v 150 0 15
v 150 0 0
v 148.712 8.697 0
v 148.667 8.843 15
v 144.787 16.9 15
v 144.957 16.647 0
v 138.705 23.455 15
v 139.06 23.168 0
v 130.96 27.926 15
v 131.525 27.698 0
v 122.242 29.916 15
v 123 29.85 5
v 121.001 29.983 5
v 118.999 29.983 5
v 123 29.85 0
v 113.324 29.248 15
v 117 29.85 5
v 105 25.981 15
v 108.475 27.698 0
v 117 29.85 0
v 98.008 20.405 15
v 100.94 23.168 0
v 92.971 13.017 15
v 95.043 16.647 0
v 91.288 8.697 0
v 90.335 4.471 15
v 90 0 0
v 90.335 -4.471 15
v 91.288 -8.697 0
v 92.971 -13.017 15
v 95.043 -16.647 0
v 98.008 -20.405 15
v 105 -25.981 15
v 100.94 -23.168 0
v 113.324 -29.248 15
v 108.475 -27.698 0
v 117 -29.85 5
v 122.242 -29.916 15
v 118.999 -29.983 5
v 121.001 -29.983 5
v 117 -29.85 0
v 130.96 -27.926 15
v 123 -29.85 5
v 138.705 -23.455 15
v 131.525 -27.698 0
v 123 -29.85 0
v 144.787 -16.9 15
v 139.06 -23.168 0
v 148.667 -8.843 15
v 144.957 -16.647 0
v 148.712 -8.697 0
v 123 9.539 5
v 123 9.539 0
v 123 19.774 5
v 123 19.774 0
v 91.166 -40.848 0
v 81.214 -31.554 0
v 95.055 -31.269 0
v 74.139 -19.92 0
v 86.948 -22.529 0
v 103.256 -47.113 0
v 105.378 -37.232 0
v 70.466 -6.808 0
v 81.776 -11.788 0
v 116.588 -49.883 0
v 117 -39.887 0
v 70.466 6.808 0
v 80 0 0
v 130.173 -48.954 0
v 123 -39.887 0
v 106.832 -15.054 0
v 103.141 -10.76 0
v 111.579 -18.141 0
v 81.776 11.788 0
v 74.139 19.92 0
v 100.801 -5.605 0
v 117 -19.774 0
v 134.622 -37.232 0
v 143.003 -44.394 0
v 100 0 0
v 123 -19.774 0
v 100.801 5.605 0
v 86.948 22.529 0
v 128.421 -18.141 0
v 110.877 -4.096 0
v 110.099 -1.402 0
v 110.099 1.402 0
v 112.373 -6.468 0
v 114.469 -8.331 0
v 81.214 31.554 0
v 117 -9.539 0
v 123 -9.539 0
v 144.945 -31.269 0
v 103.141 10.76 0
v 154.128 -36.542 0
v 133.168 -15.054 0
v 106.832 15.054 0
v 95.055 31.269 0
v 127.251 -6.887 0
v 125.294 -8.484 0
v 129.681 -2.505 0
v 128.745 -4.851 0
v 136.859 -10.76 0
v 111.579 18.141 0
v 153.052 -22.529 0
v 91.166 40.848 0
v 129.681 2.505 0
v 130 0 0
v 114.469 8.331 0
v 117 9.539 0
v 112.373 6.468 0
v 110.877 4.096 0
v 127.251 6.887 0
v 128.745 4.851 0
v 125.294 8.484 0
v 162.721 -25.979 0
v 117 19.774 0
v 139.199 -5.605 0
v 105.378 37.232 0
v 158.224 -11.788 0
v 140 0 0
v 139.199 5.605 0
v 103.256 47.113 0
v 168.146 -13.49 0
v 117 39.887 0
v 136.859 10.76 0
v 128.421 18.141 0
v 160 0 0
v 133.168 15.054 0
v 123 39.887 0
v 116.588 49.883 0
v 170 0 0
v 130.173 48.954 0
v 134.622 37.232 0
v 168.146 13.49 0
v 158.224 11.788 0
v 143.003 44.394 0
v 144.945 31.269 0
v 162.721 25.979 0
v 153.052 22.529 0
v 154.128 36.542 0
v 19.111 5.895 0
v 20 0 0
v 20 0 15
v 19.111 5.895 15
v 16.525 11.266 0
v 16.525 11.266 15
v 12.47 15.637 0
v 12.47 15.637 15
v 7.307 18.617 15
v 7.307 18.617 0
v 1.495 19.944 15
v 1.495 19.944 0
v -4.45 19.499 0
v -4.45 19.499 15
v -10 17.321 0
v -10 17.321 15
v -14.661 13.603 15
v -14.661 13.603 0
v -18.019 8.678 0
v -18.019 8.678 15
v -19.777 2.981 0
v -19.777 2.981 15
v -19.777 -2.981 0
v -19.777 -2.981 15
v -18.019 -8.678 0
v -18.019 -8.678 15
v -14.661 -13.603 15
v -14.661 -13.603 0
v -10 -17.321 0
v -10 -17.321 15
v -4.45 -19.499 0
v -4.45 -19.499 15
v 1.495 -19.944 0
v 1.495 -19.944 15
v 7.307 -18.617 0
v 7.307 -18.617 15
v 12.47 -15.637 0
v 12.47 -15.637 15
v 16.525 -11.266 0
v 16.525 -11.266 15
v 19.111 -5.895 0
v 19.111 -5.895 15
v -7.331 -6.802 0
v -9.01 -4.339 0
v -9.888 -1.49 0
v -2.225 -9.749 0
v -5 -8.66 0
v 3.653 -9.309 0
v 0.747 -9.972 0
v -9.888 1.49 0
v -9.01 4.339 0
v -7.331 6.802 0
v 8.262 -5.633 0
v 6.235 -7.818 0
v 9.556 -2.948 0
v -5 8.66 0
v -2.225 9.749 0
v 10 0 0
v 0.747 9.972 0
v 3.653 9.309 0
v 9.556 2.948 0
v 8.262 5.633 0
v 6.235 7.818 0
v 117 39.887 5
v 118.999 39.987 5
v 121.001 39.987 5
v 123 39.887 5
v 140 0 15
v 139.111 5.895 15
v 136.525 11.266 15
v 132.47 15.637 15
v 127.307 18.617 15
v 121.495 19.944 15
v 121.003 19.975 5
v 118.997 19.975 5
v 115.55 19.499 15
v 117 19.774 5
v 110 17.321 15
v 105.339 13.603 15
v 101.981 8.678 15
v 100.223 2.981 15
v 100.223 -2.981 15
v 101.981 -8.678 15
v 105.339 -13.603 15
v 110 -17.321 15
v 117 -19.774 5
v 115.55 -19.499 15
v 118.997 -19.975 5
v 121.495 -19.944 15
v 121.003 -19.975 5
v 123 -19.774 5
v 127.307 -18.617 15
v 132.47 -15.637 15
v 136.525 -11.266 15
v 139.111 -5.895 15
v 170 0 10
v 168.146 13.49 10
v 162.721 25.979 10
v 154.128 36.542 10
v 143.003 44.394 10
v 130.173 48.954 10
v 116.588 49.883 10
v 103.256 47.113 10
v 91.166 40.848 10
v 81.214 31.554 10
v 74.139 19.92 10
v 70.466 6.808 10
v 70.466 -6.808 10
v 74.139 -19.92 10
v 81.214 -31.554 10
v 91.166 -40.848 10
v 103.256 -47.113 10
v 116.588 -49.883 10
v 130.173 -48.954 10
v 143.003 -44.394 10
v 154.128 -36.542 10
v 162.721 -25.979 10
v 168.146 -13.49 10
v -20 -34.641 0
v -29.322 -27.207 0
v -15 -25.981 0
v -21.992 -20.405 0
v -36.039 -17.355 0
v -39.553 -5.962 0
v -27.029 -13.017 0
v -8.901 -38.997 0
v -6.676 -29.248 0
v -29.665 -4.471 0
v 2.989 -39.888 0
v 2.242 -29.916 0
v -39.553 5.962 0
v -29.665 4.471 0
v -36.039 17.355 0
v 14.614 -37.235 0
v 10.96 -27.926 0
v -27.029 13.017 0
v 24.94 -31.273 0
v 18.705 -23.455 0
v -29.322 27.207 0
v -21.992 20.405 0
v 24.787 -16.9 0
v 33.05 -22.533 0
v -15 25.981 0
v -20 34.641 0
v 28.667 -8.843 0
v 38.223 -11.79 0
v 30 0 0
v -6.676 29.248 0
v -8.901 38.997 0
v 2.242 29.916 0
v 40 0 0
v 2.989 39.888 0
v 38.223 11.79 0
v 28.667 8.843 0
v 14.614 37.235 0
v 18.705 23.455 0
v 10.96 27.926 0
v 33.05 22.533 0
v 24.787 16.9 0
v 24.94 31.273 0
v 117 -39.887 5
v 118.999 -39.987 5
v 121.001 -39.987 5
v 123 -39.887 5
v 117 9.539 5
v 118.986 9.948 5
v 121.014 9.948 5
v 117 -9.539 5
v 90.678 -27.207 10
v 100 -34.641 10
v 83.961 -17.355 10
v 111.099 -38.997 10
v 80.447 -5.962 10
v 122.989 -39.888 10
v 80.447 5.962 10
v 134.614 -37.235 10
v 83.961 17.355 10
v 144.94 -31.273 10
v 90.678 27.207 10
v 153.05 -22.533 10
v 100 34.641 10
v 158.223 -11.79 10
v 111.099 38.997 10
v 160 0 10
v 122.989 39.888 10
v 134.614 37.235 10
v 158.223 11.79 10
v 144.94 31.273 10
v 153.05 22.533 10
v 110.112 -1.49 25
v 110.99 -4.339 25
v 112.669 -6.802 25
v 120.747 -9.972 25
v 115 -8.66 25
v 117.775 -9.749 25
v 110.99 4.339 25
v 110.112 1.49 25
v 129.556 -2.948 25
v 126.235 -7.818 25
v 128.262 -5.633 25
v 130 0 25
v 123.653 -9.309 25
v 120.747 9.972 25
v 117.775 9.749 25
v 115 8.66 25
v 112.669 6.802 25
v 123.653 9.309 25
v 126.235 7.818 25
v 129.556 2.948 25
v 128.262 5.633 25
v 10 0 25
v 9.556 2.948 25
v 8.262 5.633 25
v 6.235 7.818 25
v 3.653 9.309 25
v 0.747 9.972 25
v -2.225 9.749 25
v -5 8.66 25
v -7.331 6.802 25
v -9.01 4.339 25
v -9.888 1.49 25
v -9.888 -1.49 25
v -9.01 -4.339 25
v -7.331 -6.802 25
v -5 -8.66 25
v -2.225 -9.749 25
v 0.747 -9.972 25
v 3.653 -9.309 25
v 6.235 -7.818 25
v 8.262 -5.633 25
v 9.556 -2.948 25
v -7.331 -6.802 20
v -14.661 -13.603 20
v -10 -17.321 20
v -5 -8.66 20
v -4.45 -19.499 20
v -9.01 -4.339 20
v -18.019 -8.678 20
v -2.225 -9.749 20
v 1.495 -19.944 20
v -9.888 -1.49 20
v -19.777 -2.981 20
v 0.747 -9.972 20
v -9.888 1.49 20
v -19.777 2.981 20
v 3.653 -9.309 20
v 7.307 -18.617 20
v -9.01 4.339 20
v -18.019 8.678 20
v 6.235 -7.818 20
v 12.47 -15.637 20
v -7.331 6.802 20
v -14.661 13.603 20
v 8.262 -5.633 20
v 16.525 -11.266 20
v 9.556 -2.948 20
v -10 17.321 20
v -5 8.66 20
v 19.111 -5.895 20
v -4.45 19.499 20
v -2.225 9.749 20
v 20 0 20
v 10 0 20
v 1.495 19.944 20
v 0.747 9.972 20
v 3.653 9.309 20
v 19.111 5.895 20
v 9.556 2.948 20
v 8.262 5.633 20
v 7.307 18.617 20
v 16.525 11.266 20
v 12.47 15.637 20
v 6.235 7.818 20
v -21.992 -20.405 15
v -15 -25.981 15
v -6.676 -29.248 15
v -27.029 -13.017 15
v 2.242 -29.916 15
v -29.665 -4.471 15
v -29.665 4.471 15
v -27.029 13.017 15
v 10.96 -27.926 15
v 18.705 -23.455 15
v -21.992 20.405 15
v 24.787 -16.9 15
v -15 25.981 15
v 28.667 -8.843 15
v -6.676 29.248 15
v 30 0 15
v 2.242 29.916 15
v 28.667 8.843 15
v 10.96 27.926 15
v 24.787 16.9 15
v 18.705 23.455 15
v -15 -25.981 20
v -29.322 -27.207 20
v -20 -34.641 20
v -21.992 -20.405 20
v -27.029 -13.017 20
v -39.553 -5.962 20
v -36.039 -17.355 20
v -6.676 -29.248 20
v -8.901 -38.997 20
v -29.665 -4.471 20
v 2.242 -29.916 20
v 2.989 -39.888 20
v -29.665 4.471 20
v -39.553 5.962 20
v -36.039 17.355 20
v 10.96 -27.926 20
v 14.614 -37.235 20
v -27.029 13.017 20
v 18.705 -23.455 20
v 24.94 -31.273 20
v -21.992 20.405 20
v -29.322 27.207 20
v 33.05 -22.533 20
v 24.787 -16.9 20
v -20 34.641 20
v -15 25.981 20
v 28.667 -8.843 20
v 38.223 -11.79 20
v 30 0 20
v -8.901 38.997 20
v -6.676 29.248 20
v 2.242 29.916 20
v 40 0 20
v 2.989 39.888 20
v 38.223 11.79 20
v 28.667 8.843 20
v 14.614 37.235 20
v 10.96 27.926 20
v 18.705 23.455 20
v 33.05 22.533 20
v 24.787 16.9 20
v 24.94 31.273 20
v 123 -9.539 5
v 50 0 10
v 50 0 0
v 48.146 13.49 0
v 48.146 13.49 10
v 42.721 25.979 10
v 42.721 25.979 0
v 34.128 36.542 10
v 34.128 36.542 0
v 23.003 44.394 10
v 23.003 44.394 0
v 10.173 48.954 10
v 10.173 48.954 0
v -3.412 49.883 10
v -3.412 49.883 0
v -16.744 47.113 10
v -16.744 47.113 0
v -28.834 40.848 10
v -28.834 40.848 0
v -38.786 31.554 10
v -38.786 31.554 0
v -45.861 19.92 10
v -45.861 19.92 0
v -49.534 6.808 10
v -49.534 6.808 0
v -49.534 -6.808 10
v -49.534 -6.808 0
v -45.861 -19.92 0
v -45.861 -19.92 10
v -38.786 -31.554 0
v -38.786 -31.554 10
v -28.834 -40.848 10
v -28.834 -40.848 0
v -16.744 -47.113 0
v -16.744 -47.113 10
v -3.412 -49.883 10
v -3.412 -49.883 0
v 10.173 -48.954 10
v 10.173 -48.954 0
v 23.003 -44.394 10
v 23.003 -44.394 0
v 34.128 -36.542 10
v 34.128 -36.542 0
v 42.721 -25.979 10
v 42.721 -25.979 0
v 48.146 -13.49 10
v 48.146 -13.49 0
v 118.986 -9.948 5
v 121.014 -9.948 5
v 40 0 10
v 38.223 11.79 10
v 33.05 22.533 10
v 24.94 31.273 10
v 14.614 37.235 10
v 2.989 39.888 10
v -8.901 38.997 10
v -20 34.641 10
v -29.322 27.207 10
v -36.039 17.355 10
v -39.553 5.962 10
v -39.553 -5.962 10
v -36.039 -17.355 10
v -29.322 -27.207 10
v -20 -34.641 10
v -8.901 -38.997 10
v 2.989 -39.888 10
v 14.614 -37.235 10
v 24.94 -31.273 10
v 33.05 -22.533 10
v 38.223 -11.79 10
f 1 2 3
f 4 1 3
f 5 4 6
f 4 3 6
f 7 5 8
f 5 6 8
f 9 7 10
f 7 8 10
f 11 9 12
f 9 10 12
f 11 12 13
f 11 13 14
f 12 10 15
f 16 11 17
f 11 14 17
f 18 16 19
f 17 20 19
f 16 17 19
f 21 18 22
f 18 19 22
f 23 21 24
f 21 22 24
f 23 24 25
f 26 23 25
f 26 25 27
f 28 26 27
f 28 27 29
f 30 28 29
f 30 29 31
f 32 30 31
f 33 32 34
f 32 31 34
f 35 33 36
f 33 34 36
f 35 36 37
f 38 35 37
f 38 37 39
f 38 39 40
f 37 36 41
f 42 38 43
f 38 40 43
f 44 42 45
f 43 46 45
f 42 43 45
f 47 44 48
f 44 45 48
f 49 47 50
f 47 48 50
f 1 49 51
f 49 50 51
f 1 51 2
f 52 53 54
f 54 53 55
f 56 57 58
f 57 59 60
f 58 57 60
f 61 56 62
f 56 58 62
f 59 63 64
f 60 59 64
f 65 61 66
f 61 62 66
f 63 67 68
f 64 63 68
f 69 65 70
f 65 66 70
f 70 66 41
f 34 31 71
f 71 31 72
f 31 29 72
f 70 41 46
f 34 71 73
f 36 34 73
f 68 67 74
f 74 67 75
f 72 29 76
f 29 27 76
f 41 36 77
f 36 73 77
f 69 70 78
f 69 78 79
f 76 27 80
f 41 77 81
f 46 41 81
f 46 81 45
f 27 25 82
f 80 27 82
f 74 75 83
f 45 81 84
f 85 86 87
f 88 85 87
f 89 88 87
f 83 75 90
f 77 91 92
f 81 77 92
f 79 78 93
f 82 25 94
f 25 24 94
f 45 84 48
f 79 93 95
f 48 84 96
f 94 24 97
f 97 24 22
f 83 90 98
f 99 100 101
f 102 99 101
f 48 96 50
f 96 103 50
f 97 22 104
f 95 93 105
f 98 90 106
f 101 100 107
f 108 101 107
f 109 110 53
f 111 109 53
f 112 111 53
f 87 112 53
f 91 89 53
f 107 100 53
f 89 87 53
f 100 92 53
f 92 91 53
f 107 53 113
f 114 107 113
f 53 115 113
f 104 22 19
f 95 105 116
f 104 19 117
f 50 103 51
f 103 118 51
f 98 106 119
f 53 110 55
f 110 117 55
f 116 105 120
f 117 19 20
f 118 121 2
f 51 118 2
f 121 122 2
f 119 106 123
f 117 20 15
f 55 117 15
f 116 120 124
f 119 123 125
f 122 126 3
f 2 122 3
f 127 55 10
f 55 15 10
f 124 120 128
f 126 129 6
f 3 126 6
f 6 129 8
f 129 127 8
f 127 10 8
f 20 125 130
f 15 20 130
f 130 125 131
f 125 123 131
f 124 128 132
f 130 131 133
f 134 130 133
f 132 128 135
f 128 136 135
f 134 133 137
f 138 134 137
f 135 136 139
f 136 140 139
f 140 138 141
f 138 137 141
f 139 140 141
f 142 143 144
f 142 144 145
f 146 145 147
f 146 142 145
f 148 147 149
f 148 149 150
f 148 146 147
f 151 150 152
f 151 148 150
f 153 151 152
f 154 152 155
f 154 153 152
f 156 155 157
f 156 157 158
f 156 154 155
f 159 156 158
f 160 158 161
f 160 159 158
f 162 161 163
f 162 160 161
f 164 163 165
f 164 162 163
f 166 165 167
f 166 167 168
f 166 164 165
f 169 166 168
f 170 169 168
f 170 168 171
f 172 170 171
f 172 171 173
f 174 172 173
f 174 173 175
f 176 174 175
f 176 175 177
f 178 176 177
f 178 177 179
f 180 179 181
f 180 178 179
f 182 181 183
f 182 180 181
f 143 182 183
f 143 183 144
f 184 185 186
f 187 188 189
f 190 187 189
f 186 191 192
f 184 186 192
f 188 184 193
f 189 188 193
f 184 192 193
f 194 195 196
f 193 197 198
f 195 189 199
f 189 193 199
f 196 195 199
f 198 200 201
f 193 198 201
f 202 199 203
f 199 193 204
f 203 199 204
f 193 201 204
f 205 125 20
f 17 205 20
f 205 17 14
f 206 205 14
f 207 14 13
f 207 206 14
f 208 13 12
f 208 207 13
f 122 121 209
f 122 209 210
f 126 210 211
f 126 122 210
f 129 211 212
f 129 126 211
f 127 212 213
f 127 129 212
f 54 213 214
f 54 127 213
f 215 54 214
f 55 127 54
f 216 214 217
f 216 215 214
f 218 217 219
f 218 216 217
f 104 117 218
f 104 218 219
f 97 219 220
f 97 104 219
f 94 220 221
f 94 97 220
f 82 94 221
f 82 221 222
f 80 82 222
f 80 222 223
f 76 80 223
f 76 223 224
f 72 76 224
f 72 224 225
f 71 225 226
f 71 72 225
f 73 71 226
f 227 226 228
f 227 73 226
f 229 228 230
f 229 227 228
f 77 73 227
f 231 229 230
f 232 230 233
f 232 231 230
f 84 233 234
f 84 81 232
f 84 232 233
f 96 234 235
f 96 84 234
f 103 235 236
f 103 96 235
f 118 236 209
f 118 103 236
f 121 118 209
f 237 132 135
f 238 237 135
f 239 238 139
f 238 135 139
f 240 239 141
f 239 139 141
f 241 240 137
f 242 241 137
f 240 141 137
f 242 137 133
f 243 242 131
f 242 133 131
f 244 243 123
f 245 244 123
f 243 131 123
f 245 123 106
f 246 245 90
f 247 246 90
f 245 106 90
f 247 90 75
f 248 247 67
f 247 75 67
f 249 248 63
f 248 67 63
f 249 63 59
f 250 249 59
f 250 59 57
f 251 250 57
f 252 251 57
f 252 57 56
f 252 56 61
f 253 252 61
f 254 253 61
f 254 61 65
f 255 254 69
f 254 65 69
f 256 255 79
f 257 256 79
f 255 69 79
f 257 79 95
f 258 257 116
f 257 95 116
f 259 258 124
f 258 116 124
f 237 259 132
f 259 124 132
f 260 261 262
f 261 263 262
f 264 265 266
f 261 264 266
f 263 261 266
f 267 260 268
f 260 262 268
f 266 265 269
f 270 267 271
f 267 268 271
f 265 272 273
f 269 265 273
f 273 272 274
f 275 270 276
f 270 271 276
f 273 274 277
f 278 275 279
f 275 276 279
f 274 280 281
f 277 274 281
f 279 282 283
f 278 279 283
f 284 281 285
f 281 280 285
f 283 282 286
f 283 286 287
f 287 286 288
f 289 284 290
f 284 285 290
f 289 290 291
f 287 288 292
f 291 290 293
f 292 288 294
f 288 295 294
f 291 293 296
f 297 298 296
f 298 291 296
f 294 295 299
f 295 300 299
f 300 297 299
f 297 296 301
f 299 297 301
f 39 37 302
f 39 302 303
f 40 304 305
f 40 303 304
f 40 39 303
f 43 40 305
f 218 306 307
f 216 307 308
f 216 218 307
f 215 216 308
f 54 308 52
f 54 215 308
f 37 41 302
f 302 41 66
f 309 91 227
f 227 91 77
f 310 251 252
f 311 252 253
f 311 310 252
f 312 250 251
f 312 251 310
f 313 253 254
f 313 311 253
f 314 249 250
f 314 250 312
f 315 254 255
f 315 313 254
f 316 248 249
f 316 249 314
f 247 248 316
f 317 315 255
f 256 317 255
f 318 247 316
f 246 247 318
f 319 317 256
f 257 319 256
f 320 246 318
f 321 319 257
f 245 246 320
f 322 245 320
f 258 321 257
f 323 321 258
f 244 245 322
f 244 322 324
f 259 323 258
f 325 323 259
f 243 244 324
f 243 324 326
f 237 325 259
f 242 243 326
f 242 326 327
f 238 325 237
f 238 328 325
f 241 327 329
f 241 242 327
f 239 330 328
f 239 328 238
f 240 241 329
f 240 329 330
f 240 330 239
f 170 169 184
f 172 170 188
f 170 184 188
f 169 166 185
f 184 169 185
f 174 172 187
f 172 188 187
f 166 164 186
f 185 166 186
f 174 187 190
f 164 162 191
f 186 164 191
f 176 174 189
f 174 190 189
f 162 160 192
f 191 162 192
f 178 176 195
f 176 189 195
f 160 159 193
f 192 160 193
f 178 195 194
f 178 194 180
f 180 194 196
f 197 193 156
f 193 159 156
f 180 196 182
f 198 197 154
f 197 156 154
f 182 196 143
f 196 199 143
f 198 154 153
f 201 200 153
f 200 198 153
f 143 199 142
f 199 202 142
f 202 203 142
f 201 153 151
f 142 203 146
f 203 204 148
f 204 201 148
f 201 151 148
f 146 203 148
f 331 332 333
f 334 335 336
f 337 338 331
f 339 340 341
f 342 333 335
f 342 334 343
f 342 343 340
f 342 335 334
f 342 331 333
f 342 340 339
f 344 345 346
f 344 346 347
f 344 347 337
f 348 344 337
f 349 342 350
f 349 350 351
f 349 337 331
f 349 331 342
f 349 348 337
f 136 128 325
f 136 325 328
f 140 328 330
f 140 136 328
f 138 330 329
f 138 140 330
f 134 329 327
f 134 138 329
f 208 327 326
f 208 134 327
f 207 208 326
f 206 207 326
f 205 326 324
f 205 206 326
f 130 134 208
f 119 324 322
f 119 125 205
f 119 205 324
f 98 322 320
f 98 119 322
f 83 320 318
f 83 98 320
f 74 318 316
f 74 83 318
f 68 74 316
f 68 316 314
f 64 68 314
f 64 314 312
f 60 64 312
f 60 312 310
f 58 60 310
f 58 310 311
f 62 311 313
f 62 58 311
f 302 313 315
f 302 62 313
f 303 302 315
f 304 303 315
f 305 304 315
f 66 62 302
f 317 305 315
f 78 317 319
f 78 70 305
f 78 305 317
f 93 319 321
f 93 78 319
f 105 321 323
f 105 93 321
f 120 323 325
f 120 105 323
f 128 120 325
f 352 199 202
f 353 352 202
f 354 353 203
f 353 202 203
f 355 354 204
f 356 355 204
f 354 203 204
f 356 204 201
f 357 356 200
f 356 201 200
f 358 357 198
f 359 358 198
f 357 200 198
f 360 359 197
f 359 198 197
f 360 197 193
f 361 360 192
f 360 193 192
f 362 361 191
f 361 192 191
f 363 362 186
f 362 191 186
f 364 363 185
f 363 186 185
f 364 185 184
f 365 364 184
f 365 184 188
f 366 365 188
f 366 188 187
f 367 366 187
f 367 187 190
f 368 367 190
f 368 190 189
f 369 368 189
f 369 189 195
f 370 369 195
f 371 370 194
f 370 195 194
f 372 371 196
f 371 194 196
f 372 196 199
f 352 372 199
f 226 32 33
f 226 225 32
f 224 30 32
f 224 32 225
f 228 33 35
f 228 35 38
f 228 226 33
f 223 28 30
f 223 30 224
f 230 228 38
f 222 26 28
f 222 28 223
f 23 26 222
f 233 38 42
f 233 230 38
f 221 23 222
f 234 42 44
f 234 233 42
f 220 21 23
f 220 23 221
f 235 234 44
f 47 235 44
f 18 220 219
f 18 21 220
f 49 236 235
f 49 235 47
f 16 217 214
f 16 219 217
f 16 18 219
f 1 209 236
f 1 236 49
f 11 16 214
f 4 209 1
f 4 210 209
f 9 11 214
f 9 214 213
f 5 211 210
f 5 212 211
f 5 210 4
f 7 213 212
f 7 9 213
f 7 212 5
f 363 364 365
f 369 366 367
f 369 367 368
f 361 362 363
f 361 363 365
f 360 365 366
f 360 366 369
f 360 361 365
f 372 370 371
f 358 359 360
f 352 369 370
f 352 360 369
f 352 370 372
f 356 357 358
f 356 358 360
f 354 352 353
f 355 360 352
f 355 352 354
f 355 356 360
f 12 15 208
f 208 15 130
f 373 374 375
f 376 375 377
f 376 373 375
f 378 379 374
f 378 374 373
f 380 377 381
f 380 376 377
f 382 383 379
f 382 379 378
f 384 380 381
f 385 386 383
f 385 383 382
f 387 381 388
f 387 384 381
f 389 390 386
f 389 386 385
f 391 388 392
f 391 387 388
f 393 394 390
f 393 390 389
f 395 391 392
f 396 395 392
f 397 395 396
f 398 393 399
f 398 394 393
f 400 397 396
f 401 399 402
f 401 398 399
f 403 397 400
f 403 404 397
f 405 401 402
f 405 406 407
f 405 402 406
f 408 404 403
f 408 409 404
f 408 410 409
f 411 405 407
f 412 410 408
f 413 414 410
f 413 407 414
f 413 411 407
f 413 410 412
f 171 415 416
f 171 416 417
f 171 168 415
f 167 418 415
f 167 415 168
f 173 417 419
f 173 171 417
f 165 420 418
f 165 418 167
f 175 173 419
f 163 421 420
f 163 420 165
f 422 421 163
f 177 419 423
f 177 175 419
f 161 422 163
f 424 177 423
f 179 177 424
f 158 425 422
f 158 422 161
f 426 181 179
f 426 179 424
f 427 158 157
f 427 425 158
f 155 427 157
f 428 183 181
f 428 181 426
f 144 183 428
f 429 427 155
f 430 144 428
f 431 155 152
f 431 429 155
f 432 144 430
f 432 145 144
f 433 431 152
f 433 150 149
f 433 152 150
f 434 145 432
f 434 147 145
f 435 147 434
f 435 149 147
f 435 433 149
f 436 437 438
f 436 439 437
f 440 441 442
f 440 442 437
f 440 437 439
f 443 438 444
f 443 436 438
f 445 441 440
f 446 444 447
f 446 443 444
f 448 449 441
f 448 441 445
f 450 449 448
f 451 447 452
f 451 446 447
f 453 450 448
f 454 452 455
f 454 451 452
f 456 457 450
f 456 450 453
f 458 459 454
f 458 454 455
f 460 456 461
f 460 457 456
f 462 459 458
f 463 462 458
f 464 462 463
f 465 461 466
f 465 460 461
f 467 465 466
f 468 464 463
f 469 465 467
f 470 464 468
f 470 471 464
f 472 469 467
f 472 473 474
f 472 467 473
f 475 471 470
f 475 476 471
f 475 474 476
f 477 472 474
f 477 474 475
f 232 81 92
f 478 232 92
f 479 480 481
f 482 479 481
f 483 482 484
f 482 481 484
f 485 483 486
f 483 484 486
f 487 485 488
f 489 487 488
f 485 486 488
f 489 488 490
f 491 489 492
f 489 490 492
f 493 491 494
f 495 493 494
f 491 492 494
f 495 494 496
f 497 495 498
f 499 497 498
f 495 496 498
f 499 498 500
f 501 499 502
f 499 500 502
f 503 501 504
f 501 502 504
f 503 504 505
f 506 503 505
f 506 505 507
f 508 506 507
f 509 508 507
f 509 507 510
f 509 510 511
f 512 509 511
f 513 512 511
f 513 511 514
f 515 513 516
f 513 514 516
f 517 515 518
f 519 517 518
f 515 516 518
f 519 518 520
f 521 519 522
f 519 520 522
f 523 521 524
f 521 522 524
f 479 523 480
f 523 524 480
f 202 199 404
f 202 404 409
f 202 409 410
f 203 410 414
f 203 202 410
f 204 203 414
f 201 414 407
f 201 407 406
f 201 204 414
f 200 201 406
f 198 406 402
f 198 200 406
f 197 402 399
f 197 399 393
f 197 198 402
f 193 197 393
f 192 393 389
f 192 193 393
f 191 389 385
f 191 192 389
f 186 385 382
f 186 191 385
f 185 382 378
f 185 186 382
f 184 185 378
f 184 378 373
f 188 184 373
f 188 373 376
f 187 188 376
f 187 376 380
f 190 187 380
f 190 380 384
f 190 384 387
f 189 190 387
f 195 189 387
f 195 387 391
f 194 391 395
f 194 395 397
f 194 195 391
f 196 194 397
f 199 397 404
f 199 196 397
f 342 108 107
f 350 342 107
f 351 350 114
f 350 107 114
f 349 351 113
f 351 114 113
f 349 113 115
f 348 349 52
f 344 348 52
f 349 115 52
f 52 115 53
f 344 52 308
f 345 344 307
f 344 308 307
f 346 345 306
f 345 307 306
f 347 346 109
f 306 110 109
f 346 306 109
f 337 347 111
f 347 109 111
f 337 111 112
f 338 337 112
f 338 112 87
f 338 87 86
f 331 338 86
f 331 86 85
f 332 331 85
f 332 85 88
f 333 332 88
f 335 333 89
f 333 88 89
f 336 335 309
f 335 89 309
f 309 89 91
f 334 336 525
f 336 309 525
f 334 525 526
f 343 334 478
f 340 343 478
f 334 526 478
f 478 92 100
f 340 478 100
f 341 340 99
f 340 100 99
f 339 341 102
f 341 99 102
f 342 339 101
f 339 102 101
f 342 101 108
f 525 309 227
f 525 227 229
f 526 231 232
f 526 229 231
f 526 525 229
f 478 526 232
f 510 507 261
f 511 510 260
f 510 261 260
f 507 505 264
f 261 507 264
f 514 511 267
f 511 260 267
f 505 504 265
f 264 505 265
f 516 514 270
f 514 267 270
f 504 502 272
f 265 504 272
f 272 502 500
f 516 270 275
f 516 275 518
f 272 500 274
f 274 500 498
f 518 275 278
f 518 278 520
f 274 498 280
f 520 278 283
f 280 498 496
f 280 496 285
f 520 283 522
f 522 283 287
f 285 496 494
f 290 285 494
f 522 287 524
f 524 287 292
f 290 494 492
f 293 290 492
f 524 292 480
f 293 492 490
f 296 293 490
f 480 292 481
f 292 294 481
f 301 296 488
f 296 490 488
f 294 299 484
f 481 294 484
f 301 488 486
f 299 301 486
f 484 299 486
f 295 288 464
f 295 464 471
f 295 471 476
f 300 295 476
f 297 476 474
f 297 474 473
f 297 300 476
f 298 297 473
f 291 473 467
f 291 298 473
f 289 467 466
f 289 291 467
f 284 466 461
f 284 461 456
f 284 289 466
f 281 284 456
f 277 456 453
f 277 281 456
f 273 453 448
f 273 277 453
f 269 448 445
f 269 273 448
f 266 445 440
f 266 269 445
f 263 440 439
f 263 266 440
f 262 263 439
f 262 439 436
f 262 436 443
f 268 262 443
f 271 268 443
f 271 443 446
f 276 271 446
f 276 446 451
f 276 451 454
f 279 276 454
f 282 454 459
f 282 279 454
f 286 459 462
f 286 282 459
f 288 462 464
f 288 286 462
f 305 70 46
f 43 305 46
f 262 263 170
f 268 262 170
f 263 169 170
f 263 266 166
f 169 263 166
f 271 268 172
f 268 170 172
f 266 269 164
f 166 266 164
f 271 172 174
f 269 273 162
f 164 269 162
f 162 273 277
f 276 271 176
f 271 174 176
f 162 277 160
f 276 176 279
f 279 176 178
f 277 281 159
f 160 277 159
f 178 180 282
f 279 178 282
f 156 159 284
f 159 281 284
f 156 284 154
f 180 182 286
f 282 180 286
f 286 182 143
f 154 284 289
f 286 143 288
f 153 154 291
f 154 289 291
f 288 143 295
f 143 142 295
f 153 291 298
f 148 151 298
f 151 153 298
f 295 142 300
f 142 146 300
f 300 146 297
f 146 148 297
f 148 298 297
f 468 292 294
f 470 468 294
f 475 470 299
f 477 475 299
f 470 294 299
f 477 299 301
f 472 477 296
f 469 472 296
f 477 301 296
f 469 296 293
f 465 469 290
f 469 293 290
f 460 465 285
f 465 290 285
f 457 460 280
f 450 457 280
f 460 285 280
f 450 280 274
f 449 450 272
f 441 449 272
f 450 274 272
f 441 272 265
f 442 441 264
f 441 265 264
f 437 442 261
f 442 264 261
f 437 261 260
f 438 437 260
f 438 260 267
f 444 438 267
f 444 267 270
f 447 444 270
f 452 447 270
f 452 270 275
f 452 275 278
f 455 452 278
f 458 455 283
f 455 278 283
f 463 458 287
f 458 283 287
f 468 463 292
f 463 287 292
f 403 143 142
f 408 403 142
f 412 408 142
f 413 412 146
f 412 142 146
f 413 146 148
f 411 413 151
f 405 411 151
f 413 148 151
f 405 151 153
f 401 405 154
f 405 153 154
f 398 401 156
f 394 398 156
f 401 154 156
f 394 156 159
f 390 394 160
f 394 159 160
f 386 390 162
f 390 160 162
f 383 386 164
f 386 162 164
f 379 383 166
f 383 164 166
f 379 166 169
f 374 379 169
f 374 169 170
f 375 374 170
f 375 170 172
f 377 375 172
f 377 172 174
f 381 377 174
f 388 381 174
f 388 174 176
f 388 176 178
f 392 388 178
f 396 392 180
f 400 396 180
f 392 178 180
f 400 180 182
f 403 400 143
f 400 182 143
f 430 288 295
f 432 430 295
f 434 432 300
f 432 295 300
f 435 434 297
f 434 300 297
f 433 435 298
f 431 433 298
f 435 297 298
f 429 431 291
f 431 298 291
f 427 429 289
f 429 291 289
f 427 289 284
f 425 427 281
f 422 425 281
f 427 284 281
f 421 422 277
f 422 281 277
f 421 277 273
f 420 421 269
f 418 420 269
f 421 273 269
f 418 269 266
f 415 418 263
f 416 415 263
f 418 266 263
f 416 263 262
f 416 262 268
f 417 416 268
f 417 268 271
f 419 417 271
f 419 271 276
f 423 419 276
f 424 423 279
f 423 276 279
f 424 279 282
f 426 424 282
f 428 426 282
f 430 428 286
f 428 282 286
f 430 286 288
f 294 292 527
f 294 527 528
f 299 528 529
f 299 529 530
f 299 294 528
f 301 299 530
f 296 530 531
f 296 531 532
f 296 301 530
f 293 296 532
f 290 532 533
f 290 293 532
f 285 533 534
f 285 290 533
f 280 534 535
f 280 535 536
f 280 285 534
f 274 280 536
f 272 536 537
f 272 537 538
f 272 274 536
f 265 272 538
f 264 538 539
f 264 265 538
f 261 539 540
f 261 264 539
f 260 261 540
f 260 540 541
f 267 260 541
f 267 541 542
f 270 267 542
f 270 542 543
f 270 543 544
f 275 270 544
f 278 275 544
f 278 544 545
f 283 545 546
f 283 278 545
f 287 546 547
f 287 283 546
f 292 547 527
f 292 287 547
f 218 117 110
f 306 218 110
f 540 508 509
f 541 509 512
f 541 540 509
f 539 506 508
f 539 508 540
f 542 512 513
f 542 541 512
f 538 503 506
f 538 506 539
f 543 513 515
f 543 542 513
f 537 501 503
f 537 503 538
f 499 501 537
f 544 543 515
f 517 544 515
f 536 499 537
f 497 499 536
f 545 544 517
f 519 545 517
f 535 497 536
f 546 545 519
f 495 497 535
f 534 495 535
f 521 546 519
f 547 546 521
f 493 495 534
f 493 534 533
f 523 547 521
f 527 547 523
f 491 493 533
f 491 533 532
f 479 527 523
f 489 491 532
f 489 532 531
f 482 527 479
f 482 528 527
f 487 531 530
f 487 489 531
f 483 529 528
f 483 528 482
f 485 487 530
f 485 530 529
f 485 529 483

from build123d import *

# Parameters (mm, degrees)
F0_R      = 50
F0_R_2    = 40
F2_DEPTH  = 10
F0_R_3    = 30
F0_R_4    = 20
F3_DEPTH  = 15
F0_R_5    = 10
F4_DEPTH  = 25
F1_R      = 50
F1_R_2    = 40
F5_DEPTH  = 10
F1_R_3    = 30
F1_R_4    = 20
F6_DEPTH  = 15
F1_R_5    = 10
F7_DEPTH  = 25
F8_W      = 6
F8_H      = 49.909919
F9_DEPTH  = 5
F10_DEPTH = 20


with BuildPart() as f2:
    # F0 (on Top) → F2 (new body)
    with BuildSketch(Plane.XY):
        Circle(F0_R)
        Circle(F0_R_2, mode=Mode.SUBTRACT)
    extrude(amount=F2_DEPTH)


with BuildPart() as f3:
    # F0 (on Top) → F3 (new body)
    with BuildSketch(Plane.XY):
        Circle(F0_R_3)
        Circle(F0_R_4, mode=Mode.SUBTRACT)
    extrude(amount=F3_DEPTH)


with BuildPart() as f4:
    # F0 (on Top) → F4 (new body)
    with BuildSketch(Plane.XY):
        Circle(F0_R_5)
    extrude(amount=F4_DEPTH)


with BuildPart() as f5:
    # F1 (on Top) → F5 (new body)
    with BuildSketch(Plane.XY):
        with Locations((120, 0)):
            Circle(F1_R)
        with Locations((120, 0)):
            Circle(F1_R_2, mode=Mode.SUBTRACT)
    extrude(amount=F5_DEPTH)



with BuildPart() as f6:
    # F1 (on Top) → F6 (new body)
    with BuildSketch(Plane.XY):
        with Locations((120, 0)):
            Circle(F1_R_3)
        with Locations((120, 0)):
            Circle(F1_R_4, mode=Mode.SUBTRACT)
    extrude(amount=F6_DEPTH)


with BuildPart() as f7:
    # F1 (on Top) → F7 (new body)
    with BuildSketch(Plane.XY):
        with Locations((120, 0)):
            Circle(F1_R_5)
    extrude(amount=F7_DEPTH)


with BuildPart() as f5_1:
    add(f5.part)

    add(f6.part)  # F9 merges F6

    add(f7.part)  # F9 merges F7
    # F8 (on Top) → F9 (join)
    with BuildSketch(Plane.XY):
        with Locations((120, 24.954959)):
            Rectangle(F8_W, F8_H)
        with Locations((120, -24.954959)):
            Rectangle(F8_W, F8_H)
    extrude(amount=F9_DEPTH)


with BuildPart() as f10:
    # F0 (on Top) → F10 (new body)
    with BuildSketch(Plane.XY):
        Circle(F0_R_2)
        Circle(F0_R_3, mode=Mode.SUBTRACT)
        Circle(F0_R_4)
        Circle(F0_R_5, mode=Mode.SUBTRACT)
    extrude(amount=F10_DEPTH)


solid = Compound([f2.part, f3.part, f4.part, f5_1.part, f10.part])
